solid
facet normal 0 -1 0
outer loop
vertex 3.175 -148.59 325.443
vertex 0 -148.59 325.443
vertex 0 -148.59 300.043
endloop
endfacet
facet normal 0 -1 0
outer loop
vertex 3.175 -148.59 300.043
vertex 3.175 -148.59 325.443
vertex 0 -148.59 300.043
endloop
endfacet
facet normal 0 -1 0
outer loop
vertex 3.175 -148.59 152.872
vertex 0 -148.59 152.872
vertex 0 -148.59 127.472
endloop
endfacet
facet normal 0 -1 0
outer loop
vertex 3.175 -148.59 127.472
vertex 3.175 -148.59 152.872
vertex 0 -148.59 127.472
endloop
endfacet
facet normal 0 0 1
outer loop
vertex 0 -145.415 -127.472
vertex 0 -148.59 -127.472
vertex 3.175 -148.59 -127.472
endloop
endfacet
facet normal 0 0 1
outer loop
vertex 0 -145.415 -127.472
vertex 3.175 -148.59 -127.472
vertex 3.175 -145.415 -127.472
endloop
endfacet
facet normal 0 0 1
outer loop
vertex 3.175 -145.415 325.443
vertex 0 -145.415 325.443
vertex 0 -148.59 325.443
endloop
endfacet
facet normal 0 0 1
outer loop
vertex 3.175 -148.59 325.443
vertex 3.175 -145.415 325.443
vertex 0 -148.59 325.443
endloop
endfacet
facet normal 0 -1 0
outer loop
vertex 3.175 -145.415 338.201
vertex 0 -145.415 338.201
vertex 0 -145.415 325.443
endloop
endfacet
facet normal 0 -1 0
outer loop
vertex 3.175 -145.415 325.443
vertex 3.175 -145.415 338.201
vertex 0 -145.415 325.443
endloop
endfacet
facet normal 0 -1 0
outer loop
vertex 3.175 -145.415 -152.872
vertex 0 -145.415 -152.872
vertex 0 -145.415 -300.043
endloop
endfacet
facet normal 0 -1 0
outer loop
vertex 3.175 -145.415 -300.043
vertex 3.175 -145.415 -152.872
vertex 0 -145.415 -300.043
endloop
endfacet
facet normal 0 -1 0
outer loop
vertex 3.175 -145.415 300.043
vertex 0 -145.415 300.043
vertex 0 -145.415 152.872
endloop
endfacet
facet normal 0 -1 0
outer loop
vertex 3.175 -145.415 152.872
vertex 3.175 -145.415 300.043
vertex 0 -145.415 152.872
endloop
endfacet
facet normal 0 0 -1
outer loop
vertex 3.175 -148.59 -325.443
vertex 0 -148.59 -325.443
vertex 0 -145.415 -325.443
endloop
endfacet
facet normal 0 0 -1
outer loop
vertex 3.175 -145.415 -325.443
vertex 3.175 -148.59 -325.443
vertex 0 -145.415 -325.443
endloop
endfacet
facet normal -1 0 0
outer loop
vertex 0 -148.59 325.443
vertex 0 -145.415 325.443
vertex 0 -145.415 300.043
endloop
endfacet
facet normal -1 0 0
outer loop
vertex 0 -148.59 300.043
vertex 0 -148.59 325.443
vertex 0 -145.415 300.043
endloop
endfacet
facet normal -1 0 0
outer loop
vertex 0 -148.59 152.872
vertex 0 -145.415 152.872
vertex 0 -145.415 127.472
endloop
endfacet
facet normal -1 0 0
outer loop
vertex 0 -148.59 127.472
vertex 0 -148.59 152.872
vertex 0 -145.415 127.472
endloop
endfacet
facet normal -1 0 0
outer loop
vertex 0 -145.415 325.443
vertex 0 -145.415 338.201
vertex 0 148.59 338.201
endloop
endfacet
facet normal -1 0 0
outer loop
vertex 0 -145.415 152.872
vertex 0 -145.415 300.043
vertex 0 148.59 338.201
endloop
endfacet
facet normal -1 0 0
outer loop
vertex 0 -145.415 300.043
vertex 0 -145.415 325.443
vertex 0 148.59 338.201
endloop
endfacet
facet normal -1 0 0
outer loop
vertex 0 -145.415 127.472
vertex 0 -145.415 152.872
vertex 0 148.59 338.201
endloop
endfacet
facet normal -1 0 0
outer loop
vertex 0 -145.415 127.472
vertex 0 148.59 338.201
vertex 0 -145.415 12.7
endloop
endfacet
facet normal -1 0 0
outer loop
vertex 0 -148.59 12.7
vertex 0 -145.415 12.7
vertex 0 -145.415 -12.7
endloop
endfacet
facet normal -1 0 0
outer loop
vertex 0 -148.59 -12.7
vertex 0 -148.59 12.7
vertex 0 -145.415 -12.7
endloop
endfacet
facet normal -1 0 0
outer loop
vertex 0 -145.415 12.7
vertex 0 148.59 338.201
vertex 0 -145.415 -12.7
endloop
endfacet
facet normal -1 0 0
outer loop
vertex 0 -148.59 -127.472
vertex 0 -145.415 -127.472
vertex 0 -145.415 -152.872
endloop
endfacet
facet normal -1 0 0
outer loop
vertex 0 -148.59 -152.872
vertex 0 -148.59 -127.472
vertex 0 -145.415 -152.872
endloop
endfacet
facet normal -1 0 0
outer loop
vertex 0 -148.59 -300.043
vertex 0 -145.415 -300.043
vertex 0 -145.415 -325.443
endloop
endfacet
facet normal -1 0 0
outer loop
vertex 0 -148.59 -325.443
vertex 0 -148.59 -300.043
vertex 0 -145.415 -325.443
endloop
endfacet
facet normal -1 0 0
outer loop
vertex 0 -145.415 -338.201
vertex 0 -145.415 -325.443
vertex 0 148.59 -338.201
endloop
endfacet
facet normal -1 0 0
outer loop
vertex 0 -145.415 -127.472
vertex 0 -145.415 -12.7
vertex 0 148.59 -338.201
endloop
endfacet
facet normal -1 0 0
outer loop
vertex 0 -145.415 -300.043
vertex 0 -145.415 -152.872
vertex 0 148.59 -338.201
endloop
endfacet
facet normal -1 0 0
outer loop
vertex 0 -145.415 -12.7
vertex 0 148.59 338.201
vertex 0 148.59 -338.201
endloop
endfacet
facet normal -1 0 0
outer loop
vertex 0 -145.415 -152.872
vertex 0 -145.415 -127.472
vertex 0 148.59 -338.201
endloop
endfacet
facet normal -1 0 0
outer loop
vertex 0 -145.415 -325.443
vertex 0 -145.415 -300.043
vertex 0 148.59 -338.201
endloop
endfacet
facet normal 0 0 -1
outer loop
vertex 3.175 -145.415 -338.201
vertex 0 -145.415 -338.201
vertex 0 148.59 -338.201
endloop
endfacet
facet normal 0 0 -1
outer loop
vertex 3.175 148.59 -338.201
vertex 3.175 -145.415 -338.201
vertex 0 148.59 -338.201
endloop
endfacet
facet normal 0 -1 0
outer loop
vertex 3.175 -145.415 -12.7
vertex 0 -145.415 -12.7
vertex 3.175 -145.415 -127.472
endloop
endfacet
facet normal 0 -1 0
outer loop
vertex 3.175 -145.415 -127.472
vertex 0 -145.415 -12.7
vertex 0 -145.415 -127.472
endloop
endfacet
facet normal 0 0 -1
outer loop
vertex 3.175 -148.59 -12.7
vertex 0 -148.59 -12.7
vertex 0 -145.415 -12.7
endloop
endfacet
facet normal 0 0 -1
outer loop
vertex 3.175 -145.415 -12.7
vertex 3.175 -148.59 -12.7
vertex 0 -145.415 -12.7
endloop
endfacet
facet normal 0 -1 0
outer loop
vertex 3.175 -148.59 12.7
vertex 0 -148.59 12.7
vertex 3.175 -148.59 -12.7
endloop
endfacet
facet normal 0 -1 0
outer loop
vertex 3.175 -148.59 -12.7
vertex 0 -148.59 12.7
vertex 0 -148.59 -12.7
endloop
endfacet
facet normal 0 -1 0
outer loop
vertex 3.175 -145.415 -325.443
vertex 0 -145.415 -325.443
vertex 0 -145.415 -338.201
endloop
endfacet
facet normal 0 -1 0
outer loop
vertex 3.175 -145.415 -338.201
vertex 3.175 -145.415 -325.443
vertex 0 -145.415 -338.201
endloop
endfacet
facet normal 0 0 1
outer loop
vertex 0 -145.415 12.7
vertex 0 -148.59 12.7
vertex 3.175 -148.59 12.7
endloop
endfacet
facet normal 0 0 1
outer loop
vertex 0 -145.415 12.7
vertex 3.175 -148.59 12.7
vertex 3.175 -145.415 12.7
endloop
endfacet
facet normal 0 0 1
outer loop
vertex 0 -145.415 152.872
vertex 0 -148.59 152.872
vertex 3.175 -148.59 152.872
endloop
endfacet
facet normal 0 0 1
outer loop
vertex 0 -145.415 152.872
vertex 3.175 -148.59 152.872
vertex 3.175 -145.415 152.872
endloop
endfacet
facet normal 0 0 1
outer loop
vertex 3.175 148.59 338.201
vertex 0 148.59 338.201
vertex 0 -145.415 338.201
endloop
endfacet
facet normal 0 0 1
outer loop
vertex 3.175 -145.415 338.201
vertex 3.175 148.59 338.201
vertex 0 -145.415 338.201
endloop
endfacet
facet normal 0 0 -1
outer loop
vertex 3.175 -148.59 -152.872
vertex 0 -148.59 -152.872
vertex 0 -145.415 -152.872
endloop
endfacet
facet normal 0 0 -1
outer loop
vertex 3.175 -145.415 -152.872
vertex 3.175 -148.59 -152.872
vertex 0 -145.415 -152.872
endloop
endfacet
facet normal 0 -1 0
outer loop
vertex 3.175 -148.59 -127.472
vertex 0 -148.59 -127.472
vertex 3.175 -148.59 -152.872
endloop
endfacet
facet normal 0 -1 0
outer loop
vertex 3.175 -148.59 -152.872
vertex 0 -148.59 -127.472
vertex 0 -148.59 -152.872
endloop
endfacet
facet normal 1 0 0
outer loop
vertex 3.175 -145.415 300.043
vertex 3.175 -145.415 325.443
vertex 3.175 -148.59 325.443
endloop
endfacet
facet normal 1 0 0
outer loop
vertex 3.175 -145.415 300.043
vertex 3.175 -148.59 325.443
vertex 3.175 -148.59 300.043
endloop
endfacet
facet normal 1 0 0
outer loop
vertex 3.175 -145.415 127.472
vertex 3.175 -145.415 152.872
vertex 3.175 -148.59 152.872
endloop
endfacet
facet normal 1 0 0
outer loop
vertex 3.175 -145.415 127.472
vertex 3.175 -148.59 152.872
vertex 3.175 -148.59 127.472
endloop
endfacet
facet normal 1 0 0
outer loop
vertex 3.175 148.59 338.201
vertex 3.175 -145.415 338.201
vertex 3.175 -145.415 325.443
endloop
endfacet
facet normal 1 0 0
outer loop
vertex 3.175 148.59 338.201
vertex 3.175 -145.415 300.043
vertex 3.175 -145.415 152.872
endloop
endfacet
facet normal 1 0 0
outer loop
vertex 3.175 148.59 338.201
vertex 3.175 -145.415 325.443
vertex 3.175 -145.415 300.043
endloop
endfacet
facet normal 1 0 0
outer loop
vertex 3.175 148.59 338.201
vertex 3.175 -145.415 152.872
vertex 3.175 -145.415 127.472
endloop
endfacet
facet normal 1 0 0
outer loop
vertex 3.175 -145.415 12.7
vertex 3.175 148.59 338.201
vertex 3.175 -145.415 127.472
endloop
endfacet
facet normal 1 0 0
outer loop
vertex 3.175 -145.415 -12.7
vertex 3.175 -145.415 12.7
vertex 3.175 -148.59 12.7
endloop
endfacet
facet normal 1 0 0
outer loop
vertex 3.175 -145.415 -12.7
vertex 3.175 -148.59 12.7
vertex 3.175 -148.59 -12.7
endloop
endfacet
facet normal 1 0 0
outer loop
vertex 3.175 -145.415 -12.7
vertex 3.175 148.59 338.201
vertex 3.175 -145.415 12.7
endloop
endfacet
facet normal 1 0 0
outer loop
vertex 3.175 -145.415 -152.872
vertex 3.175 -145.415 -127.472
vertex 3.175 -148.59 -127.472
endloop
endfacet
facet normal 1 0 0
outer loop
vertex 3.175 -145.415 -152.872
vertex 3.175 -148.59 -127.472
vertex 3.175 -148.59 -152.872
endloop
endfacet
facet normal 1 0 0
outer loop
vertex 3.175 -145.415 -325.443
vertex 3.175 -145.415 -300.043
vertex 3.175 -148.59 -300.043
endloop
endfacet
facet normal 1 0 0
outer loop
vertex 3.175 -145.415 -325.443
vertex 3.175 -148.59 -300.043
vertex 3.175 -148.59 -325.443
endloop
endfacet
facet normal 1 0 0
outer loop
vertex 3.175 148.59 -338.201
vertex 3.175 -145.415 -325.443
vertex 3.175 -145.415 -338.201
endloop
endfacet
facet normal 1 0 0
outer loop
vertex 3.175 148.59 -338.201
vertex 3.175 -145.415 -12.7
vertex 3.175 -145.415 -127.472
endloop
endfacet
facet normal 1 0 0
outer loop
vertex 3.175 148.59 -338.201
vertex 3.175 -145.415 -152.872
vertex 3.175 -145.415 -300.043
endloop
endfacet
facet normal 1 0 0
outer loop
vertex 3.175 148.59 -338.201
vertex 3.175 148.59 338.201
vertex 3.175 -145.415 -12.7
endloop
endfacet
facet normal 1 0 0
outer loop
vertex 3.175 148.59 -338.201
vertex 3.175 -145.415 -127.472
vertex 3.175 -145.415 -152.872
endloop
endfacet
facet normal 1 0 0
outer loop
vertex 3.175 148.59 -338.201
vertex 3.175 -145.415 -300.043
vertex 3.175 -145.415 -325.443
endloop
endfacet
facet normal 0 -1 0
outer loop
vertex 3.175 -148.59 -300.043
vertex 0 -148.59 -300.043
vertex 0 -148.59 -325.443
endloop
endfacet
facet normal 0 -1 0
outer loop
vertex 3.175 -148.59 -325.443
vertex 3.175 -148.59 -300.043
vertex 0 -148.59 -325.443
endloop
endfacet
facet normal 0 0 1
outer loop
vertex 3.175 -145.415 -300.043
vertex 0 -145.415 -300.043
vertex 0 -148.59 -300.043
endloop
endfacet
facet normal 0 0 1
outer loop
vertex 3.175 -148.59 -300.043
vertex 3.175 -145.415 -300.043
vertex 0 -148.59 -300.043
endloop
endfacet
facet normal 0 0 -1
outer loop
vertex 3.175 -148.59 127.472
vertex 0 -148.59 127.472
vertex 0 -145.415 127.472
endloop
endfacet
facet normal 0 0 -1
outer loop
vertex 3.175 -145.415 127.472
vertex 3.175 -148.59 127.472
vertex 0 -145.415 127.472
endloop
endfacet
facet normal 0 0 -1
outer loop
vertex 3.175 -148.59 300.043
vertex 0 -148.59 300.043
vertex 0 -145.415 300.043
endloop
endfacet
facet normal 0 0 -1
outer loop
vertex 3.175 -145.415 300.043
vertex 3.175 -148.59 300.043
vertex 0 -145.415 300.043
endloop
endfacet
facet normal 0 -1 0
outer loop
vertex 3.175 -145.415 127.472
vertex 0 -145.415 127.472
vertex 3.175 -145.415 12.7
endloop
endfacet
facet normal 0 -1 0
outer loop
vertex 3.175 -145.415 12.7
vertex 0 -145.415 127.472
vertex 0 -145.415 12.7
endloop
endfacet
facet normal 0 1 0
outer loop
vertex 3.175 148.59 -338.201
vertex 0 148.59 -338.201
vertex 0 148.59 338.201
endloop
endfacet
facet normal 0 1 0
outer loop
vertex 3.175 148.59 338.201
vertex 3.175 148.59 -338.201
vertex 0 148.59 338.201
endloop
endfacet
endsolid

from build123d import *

# Parameters (mm, degrees)
SKETCH1_W           = 25.4
SKETCH1_H           = 3.175
BOSS_EXTRUDE1_DEPTH = 3.175


with BuildPart() as part:
    # Sketch1 → Boss-Extrude1 (new body)
    with BuildSketch(Plane(origin=(0, 0, 0), x_dir=(0, 0, -1), z_dir=(1, 0, 0))):
        Polygon((-12.7, -145.415), (12.7, -145.415), (127.47244, -145.415), (152.87244, -145.415), (300.04258, -145.415), (300.04258, -148.59), (325.44258, -148.59), (325.44258, -145.415), (338.201, -145.415), (338.201, 148.59), (-338.201, 148.59), (-338.201, -145.415), (-325.44258, -145.415), (-325.44258, -148.59), (-300.04258, -148.59), (-300.04258, -145.415), (-152.87244, -145.415), (-127.47244, -145.415), align=None)
        with Locations((0, -147.0025)):
            Rectangle(SKETCH1_W, SKETCH1_H)
        with Locations((-140.17244, -147.0025)):
            Rectangle(SKETCH1_W, SKETCH1_H)
        with Locations((140.17244, -147.0025)):
            Rectangle(SKETCH1_W, SKETCH1_H)
    extrude(amount=BOSS_EXTRUDE1_DEPTH)


solid = part.part
